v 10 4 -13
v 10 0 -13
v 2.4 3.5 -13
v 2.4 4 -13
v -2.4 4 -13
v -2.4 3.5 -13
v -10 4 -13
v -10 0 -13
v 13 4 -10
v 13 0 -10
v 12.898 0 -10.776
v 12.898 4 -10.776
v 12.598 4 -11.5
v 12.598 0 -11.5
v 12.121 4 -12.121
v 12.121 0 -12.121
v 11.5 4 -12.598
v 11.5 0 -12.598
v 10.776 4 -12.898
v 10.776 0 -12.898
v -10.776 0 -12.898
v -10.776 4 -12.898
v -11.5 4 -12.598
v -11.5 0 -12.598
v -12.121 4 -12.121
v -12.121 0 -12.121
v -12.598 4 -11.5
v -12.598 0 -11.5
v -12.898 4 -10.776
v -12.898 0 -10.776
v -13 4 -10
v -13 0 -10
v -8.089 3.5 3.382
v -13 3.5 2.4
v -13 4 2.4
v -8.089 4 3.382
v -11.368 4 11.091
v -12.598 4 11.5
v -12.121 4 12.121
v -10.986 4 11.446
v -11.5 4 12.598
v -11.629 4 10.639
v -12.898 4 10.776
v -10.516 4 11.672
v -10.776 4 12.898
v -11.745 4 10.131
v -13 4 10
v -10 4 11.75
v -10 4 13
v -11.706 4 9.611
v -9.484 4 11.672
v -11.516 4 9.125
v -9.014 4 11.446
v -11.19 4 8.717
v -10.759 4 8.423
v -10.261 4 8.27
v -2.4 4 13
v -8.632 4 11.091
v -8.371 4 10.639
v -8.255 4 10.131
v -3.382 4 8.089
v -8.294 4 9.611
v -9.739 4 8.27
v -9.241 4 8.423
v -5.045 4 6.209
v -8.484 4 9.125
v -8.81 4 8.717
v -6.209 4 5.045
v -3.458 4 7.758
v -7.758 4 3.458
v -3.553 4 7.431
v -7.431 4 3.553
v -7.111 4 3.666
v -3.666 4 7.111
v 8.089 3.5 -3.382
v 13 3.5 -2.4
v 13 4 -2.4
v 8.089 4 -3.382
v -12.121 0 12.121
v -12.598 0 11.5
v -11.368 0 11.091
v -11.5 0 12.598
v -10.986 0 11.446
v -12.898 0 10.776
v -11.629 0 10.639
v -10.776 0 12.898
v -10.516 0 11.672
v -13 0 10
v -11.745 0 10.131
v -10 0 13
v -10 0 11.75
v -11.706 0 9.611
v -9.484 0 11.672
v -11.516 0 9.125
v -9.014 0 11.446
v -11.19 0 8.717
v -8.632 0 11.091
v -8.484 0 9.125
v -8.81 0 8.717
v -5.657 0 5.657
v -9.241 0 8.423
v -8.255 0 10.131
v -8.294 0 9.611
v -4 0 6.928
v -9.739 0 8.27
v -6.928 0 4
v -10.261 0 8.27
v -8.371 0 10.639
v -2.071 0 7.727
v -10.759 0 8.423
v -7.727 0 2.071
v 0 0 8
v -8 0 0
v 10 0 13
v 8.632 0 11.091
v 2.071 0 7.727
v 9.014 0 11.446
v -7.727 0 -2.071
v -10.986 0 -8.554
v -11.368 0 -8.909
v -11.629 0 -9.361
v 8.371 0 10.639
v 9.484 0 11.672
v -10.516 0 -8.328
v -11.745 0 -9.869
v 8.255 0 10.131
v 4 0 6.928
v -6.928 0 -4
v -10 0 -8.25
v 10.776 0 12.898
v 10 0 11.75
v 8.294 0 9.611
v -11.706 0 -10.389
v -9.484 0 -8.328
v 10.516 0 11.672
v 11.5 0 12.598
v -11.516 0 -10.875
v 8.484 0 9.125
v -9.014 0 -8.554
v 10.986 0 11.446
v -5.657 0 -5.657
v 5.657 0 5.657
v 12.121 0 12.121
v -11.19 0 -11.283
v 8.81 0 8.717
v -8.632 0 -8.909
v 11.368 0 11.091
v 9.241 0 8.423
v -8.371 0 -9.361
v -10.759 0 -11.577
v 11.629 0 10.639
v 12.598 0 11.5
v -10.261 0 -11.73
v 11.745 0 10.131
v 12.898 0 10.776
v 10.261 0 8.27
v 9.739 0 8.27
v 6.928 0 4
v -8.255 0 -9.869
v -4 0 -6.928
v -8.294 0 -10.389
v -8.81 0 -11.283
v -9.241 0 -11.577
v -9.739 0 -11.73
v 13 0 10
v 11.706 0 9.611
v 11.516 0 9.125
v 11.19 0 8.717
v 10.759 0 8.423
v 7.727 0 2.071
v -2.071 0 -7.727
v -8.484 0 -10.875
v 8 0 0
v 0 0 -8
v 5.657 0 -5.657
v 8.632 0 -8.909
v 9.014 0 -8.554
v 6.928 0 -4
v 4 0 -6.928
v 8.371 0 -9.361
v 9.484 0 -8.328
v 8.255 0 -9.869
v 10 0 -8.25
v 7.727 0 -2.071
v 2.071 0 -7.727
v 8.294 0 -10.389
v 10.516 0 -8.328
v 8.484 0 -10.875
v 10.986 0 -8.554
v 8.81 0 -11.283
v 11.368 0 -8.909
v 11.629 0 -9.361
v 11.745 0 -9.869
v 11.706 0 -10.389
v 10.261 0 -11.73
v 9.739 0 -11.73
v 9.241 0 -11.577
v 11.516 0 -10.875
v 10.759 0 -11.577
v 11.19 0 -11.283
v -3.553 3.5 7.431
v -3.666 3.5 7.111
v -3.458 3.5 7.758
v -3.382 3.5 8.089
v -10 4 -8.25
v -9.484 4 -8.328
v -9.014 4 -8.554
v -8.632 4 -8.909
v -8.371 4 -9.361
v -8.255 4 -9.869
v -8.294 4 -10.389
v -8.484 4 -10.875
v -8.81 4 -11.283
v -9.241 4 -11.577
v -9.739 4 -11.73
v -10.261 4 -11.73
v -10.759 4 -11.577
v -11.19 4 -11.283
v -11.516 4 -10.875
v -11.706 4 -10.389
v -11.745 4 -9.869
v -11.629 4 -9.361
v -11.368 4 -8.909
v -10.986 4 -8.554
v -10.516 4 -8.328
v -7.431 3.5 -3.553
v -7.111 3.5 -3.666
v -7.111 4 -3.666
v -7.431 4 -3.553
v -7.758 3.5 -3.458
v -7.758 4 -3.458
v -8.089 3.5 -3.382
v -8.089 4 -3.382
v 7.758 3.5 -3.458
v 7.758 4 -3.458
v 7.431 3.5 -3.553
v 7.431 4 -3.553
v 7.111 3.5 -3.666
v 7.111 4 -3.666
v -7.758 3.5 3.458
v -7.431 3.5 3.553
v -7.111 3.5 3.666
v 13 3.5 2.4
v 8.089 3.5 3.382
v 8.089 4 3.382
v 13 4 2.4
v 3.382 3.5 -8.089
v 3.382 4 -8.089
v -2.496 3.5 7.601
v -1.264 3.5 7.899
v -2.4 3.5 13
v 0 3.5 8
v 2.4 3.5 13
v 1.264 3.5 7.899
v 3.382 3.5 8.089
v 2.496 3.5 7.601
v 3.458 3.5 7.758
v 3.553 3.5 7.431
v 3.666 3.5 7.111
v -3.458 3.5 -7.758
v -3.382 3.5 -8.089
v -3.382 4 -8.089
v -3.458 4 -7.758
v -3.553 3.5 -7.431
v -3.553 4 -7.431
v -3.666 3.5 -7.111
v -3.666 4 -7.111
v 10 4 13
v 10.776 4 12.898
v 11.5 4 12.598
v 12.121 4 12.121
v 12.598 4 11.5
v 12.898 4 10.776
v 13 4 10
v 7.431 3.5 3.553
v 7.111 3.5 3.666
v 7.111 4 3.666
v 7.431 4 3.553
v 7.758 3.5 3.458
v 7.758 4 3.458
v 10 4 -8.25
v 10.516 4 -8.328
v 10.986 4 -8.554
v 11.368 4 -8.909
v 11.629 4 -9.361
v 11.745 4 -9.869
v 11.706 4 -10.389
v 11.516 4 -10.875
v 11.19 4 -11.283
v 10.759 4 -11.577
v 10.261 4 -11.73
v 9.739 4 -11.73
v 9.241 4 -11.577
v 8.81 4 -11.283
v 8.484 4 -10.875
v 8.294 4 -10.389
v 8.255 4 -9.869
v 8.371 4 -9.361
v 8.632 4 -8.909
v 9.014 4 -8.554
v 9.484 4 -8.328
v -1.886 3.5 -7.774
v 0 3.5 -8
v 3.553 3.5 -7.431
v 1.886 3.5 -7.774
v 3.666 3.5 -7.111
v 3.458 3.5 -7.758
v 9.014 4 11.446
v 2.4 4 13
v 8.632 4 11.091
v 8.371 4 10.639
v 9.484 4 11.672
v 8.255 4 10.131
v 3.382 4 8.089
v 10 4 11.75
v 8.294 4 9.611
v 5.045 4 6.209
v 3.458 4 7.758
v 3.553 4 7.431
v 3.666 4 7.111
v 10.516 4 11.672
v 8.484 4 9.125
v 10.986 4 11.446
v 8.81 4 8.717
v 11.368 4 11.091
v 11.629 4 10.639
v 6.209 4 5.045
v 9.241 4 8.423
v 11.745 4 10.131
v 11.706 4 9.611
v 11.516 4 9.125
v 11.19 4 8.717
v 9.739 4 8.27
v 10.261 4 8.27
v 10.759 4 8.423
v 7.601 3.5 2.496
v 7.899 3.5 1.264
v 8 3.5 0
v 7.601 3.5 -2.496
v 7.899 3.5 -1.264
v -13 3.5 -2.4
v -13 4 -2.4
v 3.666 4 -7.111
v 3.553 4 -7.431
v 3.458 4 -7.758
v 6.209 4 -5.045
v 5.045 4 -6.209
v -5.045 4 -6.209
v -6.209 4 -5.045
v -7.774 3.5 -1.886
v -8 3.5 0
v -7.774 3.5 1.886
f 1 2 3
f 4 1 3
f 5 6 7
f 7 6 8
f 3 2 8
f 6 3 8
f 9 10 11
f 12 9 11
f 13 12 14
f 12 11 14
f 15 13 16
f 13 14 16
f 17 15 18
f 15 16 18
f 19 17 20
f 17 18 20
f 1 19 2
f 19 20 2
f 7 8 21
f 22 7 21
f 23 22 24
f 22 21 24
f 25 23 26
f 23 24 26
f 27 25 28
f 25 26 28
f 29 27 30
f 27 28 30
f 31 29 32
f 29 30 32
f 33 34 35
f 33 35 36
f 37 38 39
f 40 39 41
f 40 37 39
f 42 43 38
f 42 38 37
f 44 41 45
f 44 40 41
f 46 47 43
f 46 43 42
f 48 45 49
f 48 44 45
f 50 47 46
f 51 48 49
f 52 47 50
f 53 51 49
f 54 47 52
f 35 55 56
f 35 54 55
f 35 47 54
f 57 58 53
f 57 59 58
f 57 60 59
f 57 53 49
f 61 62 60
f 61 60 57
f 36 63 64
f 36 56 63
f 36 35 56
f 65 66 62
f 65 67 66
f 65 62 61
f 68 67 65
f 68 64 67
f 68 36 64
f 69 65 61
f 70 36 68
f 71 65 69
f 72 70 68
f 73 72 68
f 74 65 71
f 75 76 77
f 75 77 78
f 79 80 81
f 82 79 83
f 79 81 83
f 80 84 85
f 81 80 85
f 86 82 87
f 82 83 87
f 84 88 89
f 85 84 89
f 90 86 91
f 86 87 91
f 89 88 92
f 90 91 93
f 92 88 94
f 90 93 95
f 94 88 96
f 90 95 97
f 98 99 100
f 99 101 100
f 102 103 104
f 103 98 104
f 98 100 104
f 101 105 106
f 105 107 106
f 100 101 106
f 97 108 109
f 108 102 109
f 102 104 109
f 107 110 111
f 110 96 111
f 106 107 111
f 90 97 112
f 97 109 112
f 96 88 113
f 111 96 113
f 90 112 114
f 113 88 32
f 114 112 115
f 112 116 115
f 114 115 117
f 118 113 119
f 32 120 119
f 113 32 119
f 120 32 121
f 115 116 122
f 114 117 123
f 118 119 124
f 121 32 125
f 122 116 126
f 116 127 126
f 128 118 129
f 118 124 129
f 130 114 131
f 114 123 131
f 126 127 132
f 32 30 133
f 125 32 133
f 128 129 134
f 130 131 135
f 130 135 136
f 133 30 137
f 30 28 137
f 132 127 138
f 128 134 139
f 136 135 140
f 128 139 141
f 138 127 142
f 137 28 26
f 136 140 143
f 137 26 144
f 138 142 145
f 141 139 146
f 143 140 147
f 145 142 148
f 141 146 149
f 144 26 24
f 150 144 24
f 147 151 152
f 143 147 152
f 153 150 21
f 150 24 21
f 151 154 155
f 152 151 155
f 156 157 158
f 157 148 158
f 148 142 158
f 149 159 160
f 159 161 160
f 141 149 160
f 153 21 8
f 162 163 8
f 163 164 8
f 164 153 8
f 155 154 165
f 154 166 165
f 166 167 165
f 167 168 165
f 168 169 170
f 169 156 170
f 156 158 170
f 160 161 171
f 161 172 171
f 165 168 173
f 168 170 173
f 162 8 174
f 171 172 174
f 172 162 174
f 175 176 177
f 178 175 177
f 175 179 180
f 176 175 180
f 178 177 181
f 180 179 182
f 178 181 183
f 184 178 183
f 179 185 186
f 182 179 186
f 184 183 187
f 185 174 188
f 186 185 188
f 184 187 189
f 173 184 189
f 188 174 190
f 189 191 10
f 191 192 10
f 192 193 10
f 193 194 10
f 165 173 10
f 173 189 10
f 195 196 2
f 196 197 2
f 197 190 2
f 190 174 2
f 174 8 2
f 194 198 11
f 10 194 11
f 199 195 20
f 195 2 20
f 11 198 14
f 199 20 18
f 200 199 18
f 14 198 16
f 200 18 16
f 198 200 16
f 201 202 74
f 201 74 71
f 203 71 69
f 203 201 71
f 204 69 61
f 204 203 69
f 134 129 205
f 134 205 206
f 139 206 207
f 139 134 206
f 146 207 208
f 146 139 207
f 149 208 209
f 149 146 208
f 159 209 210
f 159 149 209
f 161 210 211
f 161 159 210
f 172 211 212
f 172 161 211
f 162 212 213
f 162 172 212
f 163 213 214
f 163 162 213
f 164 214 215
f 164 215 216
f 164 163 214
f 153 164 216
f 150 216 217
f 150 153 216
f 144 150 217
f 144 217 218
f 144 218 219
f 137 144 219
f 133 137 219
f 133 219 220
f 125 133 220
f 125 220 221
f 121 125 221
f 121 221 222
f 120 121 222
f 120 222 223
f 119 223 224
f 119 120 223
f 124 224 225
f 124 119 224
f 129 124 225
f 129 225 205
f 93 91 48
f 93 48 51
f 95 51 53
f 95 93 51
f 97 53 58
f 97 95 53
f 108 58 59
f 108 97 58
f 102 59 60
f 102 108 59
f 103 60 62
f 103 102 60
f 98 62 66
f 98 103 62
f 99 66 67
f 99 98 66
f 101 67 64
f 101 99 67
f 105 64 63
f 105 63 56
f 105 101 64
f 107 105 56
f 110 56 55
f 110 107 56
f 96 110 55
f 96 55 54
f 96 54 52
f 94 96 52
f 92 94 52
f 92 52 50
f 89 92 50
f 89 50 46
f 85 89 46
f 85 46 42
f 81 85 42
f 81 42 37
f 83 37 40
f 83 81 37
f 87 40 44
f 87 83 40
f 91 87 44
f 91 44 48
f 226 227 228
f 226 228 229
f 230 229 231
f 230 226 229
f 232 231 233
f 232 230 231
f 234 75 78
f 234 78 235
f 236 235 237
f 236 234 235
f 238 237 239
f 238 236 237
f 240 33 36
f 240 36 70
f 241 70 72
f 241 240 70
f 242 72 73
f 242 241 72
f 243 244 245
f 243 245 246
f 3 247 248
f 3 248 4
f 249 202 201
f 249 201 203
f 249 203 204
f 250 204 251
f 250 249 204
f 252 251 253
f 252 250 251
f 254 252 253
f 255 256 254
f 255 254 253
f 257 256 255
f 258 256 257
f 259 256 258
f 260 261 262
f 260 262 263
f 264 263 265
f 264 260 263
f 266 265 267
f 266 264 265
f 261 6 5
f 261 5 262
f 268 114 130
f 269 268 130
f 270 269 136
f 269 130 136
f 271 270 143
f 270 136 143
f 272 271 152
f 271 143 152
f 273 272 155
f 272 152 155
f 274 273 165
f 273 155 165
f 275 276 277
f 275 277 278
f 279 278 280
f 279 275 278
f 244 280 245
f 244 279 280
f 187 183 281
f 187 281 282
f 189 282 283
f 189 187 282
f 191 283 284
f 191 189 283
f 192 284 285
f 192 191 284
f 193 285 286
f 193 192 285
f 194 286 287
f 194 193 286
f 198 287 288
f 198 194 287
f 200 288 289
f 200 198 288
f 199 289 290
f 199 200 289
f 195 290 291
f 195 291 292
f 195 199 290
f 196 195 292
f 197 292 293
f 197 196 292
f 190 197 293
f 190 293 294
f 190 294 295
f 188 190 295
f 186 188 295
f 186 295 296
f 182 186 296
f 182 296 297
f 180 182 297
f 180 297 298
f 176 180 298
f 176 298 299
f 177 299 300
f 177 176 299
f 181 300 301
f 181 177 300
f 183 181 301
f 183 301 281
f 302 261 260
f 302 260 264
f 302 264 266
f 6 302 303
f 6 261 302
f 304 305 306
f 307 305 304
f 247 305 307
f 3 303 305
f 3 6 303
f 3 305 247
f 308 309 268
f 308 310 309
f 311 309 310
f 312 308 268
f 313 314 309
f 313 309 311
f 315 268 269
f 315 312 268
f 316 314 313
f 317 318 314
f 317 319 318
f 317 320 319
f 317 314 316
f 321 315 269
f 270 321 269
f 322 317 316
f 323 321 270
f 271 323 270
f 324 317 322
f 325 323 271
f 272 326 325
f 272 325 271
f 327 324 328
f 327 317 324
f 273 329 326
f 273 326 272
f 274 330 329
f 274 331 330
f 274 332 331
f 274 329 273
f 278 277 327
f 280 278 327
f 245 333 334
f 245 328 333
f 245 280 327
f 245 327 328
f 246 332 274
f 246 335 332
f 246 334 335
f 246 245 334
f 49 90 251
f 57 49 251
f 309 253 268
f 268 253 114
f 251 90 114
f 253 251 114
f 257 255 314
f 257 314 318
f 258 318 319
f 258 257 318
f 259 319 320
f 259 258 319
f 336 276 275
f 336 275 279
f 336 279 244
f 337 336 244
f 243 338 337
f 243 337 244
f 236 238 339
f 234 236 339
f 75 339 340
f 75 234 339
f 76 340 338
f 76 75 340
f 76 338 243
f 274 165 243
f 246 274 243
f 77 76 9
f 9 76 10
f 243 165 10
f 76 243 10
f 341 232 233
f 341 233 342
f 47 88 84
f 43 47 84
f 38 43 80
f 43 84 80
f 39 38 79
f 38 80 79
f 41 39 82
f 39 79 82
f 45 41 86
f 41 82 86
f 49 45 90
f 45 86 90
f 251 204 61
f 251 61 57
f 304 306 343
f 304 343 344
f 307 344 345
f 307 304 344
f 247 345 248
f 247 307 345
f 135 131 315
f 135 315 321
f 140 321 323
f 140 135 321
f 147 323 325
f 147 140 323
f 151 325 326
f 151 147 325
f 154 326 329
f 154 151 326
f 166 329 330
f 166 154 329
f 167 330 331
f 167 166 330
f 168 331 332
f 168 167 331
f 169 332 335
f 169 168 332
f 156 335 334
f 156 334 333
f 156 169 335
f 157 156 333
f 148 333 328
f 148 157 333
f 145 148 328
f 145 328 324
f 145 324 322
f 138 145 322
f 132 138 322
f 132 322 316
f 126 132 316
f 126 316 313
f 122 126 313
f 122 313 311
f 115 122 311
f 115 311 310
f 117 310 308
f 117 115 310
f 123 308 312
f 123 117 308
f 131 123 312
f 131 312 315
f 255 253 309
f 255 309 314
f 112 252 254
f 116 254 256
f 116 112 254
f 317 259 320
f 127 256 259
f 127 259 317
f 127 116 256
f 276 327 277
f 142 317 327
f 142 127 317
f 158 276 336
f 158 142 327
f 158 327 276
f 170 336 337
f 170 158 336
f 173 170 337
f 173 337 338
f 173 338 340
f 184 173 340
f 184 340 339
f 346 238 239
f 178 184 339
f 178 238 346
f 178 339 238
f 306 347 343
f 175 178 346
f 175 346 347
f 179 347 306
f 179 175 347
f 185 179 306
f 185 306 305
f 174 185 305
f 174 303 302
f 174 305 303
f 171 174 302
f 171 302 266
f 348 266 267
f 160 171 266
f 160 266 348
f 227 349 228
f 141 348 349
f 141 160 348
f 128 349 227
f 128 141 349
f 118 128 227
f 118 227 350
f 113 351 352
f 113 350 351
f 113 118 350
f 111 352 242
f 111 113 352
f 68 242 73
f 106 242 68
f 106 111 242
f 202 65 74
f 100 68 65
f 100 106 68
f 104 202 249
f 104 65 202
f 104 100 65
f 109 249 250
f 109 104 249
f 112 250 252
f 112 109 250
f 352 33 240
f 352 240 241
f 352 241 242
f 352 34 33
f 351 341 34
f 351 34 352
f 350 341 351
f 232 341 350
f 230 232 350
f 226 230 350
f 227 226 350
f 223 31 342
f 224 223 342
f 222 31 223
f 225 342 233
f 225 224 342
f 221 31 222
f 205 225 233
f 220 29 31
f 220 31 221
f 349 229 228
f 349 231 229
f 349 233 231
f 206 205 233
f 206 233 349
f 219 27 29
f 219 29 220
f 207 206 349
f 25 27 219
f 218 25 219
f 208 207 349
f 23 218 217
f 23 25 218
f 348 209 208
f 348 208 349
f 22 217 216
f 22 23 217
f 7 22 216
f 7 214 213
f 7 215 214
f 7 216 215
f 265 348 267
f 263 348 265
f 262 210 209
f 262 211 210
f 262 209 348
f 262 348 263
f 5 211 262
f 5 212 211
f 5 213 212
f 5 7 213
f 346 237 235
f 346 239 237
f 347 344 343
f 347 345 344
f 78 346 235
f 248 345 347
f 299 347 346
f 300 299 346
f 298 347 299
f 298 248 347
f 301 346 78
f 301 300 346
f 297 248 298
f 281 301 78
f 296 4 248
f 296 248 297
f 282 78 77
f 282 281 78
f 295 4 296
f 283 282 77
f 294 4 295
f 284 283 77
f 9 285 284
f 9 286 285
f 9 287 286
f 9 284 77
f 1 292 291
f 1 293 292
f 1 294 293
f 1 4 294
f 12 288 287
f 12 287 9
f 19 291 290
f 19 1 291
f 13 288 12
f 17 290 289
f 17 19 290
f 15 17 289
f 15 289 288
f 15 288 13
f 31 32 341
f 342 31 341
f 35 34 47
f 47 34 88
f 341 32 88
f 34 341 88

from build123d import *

# Parameters (mm, degrees)
SKETCH_2_R          = 8
SKETCH_2_R_2        = 1.75
EXTRUDE_1_DEPTH     = 4
CUT_EXTRUDE_START   = -0.5
CUT_EXTRUDE_1_DEPTH = 0.5


with BuildPart() as part:
    # 草图2 → 凸台-拉伸1 (new body)
    with BuildSketch(Plane(origin=(0, 0, 0), x_dir=(1, 0, 0), z_dir=(0, 1, 0))):
        with BuildLine():
            Line((-13, 10), (-13, -10))
            ThreePointArc((-13, -10), (-12.121320344, -12.121320344), (-10, -13))
            Line((-10, -13), (10, -13))
            ThreePointArc((10, -13), (12.121320344, -12.121320344), (13, -10))
            Line((13, -10), (13, 10))
            ThreePointArc((13, 10), (12.121320344, 12.121320344), (10, 13))
            Line((10, 13), (-10, 13))
            ThreePointArc((-10, 13), (-12.121320344, 12.121320344), (-13, 10))
        make_face()
        with Locations(Location((0, 0, 0), (0, 0, 270))):
            Circle(SKETCH_2_R, mode=Mode.SUBTRACT)
        with Locations(Location((-10, 10, 0), (0, 0, 270))):
            Circle(SKETCH_2_R_2, mode=Mode.SUBTRACT)
        with Locations(Location((10, 10, 0), (0, 0, 270))):
            Circle(SKETCH_2_R_2, mode=Mode.SUBTRACT)
        with Locations(Location((10, -10, 0), (0, 0, 270))):
            Circle(SKETCH_2_R_2, mode=Mode.SUBTRACT)
        with Locations(Location((-10, -10, 0), (0, 0, 270))):
            Circle(SKETCH_2_R_2, mode=Mode.SUBTRACT)
    extrude(amount=EXTRUDE_1_DEPTH)

    # 草图3 → 切除-拉伸1 (cut)
    with BuildSketch(Plane(origin=(0, 4, 0), x_dir=(1, 0, 0), z_dir=(0, 1, 0)).offset(CUT_EXTRUDE_START)):
        with BuildLine():
            ThreePointArc((-8.088989369, -3.382202126), (-7.593724303, -3.503347811), (-7.110532834, -3.666104584))
            ThreePointArc((-7.110532834, -3.666104584), (-8, 0), (-7.110532834, 3.666104584))
            ThreePointArc((-7.110532834, 3.666104584), (-7.593724303, 3.503347811), (-8.088989369, 3.382202126))
            Line((-8.088989369, 3.382202126), (-13, 2.4))
            Line((-13, 2.4), (-13, -2.4))
            Line((-13, -2.4), (-8.088989369, -3.382202126))
        make_face()
        with BuildLine():
            ThreePointArc((-3.382202126, 8.088989369), (-3.503347811, 7.593724303), (-3.666104584, 7.110532834))
            ThreePointArc((-3.666104584, 7.110532834), (0, 8), (3.666104584, 7.110532834))
            ThreePointArc((3.666104584, 7.110532834), (3.503347811, 7.593724303), (3.382202126, 8.088989369))
            Line((3.382202126, 8.088989369), (2.4, 13))
            Line((2.4, 13), (-2.4, 13))
            Line((-2.4, 13), (-3.382202126, 8.088989369))
        make_face()
        with BuildLine():
            ThreePointArc((8, 0), (7.774453764, -1.886231339), (7.110532834, -3.666104584))
            ThreePointArc((7.110532834, -3.666104584), (7.593724303, -3.503347811), (8.088989369, -3.382202126))
            Line((8.088989369, -3.382202126), (13, -2.4))
            Line((13, -2.4), (13, 2.4))
            Line((13, 2.4), (8.088989369, 3.382202126))
            ThreePointArc((8.088989369, 3.382202126), (7.593724303, 3.503347811), (7.110532834, 3.666104584))
            ThreePointArc((7.110532834, 3.666104584), (7.774453764, 1.886231339), (8, 0))
        make_face()
        with BuildLine():
            Line((0, -13), (0, -8))
            ThreePointArc((0, -8), (-1.886231339, -7.774453764), (-3.666104584, -7.110532834))
            ThreePointArc((-3.666104584, -7.110532834), (-3.503347811, -7.593724303), (-3.382202126, -8.088989369))
            Line((-3.382202126, -8.088989369), (-2.4, -13))
            Line((-2.4, -13), (0, -13))
        make_face()
        with BuildLine():
            ThreePointArc((3.666104584, -7.110532834), (1.886231339, -7.774453764), (0, -8))
            Line((0, -8), (0, -13))
            Line((0, -13), (2.4, -13))
            Line((2.4, -13), (3.382202126, -8.088989369))
            ThreePointArc((3.382202126, -8.088989369), (3.503347811, -7.593724303), (3.666104584, -7.110532834))
        make_face()
    extrude(amount=CUT_EXTRUDE_1_DEPTH, mode=Mode.SUBTRACT)


solid = part.part
